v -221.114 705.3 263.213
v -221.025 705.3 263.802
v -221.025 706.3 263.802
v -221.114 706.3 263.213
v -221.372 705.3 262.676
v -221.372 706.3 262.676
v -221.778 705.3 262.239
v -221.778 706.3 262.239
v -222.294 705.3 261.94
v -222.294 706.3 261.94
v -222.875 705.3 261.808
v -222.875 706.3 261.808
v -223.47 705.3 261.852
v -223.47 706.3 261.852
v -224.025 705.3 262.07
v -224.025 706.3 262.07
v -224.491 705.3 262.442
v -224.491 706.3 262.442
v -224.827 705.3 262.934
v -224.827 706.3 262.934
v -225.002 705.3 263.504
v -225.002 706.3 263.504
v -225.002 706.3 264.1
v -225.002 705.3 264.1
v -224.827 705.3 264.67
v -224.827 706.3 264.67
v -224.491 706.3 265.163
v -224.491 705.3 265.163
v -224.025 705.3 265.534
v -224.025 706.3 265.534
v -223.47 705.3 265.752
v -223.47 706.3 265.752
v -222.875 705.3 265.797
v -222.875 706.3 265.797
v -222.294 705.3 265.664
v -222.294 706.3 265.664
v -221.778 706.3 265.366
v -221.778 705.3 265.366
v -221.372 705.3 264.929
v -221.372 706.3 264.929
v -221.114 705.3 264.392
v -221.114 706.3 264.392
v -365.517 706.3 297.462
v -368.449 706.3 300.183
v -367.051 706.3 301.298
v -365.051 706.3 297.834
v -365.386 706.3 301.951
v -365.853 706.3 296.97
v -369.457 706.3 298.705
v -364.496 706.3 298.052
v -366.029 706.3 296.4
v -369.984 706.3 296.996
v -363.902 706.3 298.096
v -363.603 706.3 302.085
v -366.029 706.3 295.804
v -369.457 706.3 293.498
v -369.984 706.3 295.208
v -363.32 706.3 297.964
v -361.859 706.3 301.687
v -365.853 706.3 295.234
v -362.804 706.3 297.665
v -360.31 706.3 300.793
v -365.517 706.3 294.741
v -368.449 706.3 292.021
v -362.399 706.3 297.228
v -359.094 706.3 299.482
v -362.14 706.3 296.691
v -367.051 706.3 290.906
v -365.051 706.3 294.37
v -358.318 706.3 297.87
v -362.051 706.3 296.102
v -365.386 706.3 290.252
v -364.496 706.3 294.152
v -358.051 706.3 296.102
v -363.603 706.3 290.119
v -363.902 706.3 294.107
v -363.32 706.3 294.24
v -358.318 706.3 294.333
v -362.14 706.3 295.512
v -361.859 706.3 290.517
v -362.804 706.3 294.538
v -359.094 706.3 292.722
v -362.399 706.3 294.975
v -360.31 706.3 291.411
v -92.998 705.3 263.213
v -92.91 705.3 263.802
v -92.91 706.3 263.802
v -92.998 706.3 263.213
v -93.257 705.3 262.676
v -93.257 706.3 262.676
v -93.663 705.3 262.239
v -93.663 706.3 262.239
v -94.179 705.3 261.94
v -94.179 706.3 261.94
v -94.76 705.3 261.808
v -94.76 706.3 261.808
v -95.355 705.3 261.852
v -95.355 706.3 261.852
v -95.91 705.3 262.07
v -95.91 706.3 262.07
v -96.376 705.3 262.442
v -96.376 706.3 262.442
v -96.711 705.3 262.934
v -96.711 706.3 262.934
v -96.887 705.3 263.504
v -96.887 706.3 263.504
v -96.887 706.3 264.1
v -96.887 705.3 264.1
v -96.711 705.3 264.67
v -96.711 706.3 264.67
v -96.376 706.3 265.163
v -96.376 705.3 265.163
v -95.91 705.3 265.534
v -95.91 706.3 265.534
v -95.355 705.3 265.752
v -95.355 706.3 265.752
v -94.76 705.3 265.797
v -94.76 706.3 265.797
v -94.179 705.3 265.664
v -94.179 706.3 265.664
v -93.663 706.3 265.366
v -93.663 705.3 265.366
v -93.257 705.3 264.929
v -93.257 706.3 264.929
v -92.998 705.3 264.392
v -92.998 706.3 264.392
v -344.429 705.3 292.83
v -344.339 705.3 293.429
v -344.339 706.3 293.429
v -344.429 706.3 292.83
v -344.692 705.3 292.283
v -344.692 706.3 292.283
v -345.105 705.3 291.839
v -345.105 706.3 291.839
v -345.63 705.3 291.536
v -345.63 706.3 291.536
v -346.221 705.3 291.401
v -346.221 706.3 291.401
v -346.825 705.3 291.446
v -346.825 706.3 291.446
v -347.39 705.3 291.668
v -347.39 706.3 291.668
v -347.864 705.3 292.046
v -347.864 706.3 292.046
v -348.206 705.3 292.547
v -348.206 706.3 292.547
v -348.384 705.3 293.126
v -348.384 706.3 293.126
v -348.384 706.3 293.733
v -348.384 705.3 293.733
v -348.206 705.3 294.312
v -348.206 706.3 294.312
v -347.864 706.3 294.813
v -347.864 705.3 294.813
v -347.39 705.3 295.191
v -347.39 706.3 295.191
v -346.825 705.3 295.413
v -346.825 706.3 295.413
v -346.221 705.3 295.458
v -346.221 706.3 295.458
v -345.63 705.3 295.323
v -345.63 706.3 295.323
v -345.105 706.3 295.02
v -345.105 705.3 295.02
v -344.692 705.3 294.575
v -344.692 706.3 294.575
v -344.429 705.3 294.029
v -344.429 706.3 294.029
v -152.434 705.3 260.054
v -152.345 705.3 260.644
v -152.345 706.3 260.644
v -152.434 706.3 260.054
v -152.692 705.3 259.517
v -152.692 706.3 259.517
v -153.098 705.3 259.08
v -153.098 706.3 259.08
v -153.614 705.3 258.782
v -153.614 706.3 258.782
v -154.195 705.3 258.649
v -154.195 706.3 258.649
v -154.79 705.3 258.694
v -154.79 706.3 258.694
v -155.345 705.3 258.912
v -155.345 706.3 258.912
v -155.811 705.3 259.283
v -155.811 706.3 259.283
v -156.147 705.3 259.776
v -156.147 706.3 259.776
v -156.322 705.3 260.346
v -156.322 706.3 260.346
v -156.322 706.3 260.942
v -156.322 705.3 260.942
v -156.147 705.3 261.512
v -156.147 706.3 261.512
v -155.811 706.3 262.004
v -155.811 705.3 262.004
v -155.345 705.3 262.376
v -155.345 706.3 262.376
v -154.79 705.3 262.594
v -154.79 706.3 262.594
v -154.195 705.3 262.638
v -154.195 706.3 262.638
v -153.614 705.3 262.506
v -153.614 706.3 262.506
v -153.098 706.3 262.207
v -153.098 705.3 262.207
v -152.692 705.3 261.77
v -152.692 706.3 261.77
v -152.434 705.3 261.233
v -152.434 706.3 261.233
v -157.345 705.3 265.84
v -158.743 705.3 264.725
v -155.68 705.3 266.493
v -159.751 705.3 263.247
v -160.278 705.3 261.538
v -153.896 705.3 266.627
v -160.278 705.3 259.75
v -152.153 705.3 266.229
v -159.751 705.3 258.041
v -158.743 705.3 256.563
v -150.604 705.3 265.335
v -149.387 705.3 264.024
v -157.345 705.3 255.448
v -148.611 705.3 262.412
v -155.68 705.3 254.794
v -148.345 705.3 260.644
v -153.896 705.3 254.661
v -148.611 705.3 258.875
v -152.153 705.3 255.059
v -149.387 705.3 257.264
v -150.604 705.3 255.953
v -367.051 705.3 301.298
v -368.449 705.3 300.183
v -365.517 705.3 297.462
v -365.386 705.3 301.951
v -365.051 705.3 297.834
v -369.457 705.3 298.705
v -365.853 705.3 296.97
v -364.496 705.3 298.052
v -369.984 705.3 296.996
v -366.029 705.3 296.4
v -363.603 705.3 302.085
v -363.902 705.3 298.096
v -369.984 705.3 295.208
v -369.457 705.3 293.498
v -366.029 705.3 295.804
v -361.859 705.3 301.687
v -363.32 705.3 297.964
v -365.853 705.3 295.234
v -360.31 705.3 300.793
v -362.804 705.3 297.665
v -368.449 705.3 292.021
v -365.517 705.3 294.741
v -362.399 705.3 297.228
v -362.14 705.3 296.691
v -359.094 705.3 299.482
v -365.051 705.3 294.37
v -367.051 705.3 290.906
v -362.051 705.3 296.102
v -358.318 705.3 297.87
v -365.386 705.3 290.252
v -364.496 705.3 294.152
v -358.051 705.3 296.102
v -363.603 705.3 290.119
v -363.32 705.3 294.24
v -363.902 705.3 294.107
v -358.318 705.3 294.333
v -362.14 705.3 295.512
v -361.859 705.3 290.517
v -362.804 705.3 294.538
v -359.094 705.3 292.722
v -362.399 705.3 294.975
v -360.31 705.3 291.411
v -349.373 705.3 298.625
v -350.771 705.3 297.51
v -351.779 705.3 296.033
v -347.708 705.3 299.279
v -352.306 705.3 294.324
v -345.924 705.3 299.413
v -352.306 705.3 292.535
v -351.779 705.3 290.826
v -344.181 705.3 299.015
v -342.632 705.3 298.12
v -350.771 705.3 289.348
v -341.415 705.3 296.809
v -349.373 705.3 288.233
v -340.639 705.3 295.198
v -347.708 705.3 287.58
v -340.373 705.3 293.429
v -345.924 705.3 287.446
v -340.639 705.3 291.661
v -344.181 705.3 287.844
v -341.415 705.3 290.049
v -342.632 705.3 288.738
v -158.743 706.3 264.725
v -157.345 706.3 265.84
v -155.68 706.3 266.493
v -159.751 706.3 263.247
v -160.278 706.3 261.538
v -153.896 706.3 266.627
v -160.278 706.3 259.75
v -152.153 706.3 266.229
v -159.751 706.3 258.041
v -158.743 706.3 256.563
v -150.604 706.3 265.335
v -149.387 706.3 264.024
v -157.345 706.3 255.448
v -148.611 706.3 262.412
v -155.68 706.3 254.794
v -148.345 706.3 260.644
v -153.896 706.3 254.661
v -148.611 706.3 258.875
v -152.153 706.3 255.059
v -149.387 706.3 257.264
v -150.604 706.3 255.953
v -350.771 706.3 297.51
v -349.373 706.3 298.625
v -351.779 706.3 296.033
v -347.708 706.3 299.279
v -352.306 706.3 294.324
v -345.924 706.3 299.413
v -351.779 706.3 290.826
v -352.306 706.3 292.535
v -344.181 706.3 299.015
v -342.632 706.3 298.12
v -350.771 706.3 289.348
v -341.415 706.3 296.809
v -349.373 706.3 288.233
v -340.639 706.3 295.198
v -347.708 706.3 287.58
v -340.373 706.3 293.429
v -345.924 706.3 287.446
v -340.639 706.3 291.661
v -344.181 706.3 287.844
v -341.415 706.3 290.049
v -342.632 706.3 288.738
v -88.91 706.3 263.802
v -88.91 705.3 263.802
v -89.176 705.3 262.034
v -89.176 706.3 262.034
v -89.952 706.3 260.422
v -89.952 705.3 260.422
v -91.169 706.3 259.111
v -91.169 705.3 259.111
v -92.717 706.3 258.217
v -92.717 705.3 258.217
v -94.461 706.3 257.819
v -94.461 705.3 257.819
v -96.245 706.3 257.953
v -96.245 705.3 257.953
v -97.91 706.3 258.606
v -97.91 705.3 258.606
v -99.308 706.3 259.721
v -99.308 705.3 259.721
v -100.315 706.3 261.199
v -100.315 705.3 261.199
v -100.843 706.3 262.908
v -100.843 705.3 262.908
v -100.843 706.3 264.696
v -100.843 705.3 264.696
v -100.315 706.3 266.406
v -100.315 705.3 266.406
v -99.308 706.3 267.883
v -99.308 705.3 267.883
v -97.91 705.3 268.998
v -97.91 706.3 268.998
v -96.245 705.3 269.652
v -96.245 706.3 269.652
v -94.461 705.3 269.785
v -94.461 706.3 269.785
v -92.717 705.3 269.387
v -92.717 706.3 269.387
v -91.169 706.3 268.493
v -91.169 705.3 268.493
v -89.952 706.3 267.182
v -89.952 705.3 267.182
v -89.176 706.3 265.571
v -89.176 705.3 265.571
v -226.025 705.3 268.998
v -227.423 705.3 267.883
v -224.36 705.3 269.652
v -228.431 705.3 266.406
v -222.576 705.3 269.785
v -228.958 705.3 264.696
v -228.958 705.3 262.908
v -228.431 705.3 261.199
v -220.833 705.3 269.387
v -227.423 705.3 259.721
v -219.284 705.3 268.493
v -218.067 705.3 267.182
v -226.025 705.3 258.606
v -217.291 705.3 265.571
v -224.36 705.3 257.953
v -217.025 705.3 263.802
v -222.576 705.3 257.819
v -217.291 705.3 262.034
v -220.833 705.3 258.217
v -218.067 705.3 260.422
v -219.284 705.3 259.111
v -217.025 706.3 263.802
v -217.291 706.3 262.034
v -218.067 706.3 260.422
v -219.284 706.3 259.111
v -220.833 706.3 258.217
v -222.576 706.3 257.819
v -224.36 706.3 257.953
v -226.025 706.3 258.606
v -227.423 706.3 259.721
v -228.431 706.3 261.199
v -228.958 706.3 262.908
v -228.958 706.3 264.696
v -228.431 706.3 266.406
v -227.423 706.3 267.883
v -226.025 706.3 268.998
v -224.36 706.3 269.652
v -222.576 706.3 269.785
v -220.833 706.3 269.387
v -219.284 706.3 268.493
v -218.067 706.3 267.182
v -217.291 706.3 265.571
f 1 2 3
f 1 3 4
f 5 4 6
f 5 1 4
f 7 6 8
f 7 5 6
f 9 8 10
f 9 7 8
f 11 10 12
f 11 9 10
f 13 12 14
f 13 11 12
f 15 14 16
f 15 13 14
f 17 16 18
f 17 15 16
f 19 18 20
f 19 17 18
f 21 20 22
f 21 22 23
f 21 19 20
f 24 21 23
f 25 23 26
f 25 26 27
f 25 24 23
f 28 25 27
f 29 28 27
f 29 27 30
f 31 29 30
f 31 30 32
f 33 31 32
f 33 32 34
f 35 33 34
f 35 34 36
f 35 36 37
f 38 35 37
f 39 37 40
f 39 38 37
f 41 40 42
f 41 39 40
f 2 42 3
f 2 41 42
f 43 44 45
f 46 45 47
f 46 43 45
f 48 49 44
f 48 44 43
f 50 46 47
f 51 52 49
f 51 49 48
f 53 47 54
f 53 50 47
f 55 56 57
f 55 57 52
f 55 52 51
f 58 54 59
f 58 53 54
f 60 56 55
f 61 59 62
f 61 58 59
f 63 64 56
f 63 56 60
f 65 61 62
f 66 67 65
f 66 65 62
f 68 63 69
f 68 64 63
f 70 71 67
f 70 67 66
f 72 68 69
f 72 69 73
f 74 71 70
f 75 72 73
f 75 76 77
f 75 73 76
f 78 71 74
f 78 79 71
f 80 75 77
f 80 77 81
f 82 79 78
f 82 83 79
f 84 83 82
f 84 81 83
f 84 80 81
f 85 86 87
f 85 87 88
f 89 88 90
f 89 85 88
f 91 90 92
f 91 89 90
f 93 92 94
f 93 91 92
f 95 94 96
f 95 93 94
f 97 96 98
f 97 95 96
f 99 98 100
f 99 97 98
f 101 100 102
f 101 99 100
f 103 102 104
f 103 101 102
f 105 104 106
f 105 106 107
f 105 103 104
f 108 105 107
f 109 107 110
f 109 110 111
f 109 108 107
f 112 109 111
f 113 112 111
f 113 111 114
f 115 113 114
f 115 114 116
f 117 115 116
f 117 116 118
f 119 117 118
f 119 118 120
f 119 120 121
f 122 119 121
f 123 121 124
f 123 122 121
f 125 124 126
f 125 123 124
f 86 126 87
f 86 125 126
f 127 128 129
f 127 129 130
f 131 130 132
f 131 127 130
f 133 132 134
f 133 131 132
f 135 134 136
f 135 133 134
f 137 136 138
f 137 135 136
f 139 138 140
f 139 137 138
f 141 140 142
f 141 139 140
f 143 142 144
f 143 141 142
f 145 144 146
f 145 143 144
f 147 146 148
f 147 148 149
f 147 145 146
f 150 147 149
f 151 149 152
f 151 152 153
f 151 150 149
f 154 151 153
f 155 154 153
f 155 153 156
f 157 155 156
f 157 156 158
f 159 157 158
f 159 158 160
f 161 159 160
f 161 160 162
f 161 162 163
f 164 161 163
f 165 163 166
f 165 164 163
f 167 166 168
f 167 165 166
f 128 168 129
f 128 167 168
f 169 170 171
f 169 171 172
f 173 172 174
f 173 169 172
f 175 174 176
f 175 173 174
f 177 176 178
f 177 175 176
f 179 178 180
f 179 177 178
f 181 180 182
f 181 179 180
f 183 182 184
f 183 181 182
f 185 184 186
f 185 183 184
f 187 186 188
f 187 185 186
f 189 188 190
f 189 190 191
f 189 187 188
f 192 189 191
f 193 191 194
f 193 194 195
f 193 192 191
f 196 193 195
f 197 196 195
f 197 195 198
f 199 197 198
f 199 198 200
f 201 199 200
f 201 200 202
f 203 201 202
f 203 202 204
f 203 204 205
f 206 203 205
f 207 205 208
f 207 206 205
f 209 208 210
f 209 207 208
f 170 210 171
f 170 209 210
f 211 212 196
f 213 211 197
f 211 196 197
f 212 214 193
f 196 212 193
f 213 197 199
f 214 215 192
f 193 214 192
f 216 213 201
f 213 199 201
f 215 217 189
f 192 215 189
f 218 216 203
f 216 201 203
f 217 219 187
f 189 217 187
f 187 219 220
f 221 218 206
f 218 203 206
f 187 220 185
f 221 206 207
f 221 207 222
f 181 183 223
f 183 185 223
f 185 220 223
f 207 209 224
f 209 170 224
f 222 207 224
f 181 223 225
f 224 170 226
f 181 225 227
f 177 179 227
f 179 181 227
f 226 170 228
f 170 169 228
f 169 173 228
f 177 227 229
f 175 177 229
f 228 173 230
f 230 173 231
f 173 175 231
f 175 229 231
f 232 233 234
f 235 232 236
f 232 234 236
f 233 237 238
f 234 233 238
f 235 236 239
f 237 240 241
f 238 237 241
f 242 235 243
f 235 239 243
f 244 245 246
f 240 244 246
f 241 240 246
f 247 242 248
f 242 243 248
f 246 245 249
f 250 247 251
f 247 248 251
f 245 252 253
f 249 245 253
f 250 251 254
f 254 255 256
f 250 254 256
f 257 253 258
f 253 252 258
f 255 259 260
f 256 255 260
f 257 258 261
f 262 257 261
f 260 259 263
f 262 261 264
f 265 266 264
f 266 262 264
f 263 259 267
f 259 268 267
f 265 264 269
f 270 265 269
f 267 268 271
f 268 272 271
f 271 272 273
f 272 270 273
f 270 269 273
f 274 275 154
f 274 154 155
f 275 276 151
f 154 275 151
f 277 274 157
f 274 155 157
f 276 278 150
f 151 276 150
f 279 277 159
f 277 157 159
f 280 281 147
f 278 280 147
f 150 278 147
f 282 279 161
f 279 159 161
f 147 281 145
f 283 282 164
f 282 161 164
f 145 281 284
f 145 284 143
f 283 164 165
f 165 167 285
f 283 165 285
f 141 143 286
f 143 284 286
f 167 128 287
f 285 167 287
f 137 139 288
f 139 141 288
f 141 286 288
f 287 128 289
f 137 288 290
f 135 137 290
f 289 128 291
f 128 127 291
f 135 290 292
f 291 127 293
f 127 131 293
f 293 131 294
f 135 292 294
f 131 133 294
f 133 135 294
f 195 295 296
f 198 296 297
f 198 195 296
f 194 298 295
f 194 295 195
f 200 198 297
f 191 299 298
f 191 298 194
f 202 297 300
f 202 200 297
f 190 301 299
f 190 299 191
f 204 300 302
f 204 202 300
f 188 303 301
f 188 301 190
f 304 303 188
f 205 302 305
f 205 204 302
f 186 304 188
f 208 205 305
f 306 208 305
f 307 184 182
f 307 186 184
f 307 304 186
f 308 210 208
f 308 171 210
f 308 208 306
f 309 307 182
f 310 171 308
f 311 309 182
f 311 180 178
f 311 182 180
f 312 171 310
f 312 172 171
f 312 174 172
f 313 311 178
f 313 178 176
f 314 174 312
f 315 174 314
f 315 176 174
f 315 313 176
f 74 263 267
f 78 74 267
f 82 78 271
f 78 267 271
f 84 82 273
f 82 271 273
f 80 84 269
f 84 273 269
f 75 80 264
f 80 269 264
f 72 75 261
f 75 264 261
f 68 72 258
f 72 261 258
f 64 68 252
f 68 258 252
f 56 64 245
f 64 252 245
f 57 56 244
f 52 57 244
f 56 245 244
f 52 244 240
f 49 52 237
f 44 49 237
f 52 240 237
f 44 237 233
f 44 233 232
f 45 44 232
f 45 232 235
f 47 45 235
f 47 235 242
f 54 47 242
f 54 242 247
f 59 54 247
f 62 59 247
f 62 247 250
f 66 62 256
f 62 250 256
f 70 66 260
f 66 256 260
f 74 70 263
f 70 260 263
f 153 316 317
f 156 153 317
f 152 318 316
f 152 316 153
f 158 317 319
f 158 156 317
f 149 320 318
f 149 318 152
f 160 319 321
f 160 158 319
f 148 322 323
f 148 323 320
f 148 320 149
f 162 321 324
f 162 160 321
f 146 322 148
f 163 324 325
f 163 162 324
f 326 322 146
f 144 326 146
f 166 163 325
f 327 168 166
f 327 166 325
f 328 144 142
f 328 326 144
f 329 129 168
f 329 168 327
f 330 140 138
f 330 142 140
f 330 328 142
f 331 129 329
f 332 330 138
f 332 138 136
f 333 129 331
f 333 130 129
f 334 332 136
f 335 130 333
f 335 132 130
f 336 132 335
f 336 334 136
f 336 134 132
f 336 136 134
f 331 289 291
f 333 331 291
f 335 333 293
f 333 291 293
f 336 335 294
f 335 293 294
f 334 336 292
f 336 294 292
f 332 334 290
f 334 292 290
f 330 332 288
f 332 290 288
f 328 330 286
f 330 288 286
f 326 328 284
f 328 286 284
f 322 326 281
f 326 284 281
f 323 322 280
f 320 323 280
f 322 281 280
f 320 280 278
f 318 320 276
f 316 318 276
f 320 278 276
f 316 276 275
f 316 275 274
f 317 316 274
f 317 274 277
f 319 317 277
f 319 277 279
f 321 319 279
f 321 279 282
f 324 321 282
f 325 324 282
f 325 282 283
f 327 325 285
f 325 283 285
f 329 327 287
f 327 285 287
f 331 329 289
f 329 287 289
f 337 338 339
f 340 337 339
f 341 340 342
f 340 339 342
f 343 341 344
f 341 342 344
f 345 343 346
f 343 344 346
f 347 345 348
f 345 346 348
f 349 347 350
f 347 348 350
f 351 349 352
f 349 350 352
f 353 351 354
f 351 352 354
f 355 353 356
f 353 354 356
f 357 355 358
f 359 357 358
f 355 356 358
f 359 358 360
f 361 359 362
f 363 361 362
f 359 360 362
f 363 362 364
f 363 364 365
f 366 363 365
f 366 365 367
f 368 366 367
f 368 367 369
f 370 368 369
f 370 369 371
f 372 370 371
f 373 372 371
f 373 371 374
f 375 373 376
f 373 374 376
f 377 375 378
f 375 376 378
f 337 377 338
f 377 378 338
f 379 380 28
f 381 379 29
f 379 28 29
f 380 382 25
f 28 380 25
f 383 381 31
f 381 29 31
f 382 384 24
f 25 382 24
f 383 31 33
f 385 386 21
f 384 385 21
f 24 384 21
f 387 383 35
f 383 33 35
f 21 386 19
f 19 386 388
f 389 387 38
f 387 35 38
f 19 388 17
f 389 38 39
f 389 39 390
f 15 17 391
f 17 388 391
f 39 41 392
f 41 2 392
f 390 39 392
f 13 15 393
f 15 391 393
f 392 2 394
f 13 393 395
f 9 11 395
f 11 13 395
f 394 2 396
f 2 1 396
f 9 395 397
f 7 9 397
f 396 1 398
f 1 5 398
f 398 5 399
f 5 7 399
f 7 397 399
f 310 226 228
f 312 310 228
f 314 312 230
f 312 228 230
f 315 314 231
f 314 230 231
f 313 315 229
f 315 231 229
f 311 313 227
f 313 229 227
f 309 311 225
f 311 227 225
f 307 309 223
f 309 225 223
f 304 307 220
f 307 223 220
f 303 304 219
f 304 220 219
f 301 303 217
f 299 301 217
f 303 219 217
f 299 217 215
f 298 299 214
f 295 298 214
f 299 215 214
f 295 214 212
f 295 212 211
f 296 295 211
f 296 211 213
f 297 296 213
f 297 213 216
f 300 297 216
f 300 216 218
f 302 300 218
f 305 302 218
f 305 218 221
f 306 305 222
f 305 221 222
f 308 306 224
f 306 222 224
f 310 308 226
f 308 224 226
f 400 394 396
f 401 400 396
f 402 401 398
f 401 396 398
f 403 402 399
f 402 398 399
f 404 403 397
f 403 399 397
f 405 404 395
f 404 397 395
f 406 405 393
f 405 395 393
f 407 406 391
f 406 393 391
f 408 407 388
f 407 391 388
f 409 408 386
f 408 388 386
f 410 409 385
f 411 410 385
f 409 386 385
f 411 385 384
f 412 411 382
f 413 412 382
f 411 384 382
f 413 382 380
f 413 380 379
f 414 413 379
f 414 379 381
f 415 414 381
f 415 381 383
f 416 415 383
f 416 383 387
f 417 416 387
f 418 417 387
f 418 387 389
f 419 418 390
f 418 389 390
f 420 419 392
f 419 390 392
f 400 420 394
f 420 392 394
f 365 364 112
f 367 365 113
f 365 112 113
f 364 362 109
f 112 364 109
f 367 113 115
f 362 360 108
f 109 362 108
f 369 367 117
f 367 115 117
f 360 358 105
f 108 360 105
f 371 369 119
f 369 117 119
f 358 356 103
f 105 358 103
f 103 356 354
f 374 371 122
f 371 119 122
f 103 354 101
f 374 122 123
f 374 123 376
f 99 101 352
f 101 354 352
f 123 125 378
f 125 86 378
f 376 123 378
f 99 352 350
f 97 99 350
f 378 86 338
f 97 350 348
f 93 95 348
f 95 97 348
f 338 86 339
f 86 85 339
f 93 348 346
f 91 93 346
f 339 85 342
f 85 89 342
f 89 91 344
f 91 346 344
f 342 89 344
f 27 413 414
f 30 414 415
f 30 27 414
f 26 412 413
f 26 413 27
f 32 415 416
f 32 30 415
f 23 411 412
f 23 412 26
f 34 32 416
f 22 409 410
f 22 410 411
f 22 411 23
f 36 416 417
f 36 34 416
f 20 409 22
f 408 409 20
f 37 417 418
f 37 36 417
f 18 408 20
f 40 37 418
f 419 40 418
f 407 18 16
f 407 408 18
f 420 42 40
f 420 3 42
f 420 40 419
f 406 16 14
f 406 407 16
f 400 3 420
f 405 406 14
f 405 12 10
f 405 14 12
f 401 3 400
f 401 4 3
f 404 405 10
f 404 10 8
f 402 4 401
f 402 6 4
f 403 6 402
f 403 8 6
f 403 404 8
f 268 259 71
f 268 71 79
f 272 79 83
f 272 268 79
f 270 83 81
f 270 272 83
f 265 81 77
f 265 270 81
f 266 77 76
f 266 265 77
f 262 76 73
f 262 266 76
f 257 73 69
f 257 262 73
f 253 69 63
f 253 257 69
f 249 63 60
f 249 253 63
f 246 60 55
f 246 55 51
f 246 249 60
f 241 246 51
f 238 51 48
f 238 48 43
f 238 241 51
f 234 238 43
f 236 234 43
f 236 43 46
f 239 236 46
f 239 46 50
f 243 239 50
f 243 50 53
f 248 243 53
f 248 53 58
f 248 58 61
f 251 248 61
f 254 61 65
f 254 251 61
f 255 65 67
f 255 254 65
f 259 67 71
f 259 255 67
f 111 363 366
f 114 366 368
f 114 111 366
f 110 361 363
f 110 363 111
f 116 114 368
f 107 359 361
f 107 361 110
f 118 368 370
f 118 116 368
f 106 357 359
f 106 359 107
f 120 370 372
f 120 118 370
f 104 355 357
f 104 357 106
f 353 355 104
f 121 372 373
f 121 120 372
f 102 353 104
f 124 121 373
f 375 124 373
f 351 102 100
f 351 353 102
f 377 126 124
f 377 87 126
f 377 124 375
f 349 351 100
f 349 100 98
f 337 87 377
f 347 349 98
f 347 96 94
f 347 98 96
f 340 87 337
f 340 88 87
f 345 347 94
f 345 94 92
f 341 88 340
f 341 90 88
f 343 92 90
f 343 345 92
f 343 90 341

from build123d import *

# Parameters (mm, degrees)
SZKIC1_R                      = 6
SZKIC1_R_2                    = 2
DODANIE_WYCI_GNI_CIE1_DEPTH   = 1
DODANIE_WYCI_GNI_CIE1_2_DEPTH = 1
DODANIE_WYCI_GNI_CIE1_3_DEPTH = 1
SZKIC1_R_3                    = 2.034219479
DODANIE_WYCI_GNI_CIE1_4_DEPTH = 1
DODANIE_WYCI_GNI_CIE1_5_DEPTH = 1


with BuildPart() as part:
    # Szkic1 → Dodanie-wyciągnięcie1 (new body)
    with BuildSketch(Plane(origin=(0, 705.3, 0), x_dir=(1, 0, 0), z_dir=(0, 1, 0))):
        with Locations((-94.909521544, -263.802212936)):
            Circle(SZKIC1_R)
        with Locations((-94.909521544, -263.802212936)):
            Circle(SZKIC1_R_2, mode=Mode.SUBTRACT)
    extrude(amount=DODANIE_WYCI_GNI_CIE1_DEPTH)


with BuildPart() as body_2:
    # Szkic1 → Dodanie-wyci_gni_cie1 2 (new body)
    with BuildSketch(Plane(origin=(0, 705.3, 0), x_dir=(1, 0, 0), z_dir=(0, 1, 0))):
        with Locations((-154.344703344, -260.643821632)):
            Circle(SZKIC1_R)
        with Locations((-154.344703344, -260.643821632)):
            Circle(SZKIC1_R_2, mode=Mode.SUBTRACT)
    extrude(amount=DODANIE_WYCI_GNI_CIE1_2_DEPTH)


with BuildPart() as body_3:
    # Szkic1 → Dodanie-wyci_gni_cie1 3 (new body)
    with BuildSketch(Plane(origin=(0, 705.3, 0), x_dir=(1, 0, 0), z_dir=(0, 1, 0))):
        with Locations((-223.024834581, -263.802212936)):
            Circle(SZKIC1_R)
        with Locations((-223.024834581, -263.802212936)):
            Circle(SZKIC1_R_2, mode=Mode.SUBTRACT)
    extrude(amount=DODANIE_WYCI_GNI_CIE1_3_DEPTH)


with BuildPart() as body_4:
    # Szkic1 → Dodanie-wyci_gni_cie1 4 (new body)
    with BuildSketch(Plane(origin=(0, 705.3, 0), x_dir=(1, 0, 0), z_dir=(0, 1, 0))):
        with Locations((-346.372819064, -293.429327819)):
            Circle(SZKIC1_R)
        with Locations((-346.372819064, -293.429327819)):
            Circle(SZKIC1_R_3, mode=Mode.SUBTRACT)
    extrude(amount=DODANIE_WYCI_GNI_CIE1_4_DEPTH)


with BuildPart() as body_5:
    # Szkic1 → Dodanie-wyci_gni_cie1 5 (new body)
    with BuildSketch(Plane(origin=(0, 705.3, 0), x_dir=(1, 0, 0), z_dir=(0, 1, 0))):
        with Locations((-364.051137421, -296.101801859)):
            Circle(SZKIC1_R)
        with Locations((-364.051137421, -296.101801859)):
            Circle(SZKIC1_R_2, mode=Mode.SUBTRACT)
    extrude(amount=DODANIE_WYCI_GNI_CIE1_5_DEPTH)


solid = Compound([part.part, body_2.part, body_3.part, body_4.part, body_5.part])
